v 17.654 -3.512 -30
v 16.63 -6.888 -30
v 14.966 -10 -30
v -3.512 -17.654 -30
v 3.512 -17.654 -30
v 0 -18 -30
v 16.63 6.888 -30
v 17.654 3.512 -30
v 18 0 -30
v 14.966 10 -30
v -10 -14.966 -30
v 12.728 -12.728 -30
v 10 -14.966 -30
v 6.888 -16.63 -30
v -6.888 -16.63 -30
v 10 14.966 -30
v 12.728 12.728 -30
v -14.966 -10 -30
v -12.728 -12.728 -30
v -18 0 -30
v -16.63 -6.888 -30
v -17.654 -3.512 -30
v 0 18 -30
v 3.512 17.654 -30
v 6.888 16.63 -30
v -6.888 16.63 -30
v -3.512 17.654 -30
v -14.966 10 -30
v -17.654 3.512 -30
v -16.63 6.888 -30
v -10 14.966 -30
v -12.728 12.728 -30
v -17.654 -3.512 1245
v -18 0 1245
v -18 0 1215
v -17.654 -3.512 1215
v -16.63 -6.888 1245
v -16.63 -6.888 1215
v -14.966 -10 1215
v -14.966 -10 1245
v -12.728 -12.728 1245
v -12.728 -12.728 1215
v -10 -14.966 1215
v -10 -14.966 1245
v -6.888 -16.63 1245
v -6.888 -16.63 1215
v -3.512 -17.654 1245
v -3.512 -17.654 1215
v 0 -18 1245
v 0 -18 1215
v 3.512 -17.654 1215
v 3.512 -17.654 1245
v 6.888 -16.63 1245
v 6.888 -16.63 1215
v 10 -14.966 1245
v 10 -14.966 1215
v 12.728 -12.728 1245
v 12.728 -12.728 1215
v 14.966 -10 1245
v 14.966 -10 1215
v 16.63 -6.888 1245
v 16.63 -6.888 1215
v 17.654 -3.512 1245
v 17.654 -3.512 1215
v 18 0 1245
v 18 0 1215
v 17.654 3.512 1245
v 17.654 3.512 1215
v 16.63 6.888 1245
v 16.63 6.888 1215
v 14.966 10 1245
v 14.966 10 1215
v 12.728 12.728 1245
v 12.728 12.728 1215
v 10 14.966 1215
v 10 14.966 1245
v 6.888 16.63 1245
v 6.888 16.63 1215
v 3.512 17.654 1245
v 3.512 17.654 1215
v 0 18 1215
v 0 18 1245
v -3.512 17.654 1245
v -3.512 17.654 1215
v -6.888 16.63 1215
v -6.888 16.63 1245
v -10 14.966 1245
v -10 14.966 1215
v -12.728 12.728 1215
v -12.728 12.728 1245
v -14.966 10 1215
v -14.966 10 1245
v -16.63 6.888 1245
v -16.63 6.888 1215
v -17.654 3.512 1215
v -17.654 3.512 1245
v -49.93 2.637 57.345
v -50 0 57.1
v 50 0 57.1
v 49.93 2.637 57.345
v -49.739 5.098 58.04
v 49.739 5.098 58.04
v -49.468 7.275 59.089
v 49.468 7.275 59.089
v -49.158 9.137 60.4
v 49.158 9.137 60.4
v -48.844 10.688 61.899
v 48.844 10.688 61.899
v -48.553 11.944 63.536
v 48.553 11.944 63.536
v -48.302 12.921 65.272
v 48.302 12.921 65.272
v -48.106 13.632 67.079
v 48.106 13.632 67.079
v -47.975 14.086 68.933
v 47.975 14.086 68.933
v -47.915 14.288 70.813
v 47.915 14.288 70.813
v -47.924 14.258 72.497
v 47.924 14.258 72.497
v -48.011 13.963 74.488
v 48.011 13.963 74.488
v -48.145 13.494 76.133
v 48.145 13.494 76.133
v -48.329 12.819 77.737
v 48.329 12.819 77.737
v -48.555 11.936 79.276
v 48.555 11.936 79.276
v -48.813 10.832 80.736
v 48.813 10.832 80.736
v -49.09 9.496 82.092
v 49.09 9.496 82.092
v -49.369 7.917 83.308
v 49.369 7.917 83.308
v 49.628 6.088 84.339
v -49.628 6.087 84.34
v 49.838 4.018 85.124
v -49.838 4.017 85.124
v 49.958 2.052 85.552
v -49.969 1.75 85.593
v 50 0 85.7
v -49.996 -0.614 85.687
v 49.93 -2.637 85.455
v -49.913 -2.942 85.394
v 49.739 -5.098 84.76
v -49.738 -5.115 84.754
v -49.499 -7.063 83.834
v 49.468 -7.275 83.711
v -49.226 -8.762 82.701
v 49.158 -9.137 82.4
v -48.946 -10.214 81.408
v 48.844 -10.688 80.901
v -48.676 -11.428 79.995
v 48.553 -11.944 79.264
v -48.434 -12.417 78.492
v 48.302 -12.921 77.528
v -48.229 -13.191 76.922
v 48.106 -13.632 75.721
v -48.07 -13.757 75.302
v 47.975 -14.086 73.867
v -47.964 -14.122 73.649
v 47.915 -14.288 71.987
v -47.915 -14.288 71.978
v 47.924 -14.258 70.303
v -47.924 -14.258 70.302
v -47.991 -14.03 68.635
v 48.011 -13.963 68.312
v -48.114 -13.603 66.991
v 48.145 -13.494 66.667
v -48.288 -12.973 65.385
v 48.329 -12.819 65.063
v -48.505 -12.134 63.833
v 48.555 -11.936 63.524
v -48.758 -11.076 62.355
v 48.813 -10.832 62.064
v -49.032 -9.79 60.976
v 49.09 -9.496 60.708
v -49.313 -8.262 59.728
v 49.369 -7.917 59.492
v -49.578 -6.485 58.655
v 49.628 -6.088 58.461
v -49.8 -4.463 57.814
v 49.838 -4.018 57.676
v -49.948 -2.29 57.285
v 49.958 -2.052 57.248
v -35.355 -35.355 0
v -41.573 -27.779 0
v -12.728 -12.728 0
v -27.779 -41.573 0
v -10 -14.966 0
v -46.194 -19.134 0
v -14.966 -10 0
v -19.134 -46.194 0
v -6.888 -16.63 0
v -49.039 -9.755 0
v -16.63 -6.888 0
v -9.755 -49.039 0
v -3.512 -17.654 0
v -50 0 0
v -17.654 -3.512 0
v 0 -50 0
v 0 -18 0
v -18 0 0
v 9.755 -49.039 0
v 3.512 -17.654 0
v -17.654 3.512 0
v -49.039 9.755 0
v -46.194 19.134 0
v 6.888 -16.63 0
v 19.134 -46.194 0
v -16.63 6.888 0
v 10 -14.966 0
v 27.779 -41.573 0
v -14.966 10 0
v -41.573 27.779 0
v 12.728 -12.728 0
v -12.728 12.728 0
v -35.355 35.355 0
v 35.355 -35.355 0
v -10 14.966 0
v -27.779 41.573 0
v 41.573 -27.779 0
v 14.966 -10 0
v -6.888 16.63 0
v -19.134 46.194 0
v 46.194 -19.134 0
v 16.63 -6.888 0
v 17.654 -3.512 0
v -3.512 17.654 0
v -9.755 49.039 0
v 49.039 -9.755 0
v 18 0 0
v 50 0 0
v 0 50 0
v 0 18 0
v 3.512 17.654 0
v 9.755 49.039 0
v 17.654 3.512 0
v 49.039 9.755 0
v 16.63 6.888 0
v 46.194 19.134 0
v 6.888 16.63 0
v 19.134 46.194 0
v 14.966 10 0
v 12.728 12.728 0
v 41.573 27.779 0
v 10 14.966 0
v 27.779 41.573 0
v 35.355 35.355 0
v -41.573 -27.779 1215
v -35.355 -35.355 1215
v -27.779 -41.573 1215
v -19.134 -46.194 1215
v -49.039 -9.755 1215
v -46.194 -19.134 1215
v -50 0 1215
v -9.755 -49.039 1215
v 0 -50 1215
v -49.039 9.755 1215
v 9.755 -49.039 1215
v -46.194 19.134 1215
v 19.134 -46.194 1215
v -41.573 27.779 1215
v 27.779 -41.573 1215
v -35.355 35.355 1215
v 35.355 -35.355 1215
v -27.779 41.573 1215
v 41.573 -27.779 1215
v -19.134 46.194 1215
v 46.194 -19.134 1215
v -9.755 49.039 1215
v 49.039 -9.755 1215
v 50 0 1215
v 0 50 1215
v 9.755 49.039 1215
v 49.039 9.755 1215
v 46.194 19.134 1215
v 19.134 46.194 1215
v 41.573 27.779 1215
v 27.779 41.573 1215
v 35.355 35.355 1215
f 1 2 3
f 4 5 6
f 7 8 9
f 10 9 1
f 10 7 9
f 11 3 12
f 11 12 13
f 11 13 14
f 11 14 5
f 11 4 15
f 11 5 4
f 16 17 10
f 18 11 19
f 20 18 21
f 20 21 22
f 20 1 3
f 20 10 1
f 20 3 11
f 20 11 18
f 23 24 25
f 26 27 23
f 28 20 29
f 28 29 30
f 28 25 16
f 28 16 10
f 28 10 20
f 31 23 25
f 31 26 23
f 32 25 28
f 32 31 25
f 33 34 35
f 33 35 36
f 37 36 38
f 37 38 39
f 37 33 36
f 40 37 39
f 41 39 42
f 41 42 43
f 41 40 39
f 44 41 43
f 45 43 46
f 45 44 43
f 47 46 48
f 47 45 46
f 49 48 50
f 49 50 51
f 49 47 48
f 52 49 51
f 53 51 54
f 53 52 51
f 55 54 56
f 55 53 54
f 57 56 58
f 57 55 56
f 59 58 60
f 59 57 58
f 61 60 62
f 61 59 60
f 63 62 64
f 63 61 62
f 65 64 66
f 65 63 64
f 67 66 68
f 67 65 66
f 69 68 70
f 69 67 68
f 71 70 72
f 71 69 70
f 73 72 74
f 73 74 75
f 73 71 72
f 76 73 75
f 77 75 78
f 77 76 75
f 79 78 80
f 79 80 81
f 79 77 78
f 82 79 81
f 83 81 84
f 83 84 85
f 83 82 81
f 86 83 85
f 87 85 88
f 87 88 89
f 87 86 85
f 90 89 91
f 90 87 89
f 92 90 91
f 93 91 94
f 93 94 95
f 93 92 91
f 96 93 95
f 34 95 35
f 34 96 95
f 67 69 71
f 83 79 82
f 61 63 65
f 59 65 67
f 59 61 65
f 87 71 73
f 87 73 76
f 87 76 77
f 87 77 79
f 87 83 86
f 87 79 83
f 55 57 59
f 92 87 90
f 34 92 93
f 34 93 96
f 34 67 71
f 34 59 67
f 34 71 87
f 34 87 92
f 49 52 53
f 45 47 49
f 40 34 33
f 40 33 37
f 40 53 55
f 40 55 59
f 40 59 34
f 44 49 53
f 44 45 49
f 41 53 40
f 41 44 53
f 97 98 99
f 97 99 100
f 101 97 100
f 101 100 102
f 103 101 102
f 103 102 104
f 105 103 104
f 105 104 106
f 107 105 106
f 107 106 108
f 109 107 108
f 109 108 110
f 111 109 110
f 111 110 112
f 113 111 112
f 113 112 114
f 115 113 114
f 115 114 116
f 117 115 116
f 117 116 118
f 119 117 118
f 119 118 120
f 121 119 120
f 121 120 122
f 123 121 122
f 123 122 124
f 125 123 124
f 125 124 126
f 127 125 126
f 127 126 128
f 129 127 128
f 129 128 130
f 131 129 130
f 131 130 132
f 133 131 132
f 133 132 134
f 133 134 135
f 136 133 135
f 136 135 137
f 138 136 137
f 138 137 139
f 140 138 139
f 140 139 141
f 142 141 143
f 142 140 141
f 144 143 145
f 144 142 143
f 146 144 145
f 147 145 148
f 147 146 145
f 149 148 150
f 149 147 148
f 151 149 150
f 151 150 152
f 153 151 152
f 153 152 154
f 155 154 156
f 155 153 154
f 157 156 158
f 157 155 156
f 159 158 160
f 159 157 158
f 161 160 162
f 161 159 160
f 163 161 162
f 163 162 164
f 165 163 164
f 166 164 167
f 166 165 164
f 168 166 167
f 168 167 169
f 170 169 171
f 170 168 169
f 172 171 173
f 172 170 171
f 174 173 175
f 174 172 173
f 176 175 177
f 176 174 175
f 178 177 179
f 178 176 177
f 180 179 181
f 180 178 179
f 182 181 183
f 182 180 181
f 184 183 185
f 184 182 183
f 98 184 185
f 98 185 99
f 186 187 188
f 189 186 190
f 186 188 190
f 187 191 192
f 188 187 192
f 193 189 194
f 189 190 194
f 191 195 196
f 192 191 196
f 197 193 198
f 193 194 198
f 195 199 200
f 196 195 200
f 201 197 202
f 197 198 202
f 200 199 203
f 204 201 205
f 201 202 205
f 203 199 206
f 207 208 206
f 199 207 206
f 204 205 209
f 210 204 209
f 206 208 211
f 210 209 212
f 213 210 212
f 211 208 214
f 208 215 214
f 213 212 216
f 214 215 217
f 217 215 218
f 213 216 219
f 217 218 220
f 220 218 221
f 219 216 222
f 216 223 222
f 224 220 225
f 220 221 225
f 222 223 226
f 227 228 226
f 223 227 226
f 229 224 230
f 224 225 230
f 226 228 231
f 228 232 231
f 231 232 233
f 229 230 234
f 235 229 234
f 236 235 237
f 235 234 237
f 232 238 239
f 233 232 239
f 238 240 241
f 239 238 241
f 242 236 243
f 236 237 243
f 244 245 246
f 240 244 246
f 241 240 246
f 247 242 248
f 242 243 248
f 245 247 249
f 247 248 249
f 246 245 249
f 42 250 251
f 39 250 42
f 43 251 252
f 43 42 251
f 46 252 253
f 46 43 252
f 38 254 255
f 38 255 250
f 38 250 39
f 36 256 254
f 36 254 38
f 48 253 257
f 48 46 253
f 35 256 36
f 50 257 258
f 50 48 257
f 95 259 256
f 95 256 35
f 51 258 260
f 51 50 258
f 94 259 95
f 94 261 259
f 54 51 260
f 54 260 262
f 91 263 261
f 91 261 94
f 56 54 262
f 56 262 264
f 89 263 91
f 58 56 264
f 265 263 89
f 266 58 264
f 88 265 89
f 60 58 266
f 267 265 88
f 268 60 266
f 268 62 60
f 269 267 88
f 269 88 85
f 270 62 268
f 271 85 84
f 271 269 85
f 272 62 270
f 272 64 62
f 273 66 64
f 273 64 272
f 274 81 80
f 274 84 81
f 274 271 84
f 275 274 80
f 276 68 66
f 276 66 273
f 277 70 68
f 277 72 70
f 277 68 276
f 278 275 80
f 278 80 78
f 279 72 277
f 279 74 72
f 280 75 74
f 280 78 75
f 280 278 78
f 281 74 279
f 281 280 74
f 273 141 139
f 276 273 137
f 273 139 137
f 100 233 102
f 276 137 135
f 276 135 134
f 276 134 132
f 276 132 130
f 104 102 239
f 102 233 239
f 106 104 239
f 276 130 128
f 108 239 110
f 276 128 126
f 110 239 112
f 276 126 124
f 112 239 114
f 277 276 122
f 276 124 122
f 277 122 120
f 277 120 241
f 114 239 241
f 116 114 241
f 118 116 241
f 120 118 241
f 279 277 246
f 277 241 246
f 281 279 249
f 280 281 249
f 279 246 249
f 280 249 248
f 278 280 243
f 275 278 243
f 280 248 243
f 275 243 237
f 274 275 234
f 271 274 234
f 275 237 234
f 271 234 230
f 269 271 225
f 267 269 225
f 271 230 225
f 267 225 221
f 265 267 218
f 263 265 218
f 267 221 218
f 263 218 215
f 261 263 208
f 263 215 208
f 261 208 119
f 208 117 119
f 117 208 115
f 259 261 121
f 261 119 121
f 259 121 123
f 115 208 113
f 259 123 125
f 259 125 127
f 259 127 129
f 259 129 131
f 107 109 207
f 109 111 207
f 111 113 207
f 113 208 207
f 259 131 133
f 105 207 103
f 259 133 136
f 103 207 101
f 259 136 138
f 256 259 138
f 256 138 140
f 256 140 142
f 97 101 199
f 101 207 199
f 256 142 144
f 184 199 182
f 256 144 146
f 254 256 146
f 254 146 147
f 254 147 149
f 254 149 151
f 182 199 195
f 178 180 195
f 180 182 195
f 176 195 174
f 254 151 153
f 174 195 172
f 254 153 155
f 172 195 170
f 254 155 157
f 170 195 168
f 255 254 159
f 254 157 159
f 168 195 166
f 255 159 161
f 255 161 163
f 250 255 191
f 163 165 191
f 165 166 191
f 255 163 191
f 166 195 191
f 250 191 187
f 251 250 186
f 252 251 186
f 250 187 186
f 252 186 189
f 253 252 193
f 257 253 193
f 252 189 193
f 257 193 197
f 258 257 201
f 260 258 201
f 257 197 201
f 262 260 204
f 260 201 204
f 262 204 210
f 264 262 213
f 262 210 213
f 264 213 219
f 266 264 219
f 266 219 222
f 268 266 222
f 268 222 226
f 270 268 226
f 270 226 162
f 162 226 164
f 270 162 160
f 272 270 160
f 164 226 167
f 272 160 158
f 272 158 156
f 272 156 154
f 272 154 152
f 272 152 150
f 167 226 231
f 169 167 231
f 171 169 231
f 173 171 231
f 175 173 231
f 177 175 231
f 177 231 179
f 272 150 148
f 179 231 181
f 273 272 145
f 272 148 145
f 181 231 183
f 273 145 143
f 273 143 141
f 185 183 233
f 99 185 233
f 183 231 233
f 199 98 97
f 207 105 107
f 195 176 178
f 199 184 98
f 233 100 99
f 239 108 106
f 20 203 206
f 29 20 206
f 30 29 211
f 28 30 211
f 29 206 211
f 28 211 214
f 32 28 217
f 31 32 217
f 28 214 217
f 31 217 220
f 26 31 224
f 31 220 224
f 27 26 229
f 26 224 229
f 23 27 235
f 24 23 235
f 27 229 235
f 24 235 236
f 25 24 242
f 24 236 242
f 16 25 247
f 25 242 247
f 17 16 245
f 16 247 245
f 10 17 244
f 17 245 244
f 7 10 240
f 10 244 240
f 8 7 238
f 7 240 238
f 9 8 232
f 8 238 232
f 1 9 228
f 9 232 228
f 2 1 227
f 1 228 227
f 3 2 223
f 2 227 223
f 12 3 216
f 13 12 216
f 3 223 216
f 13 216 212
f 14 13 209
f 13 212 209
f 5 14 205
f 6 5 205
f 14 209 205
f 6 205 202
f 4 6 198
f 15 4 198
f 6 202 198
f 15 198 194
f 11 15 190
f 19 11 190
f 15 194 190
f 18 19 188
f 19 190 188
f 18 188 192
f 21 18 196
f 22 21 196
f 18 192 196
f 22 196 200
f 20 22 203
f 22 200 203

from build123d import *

# Parameters (mm, degrees)
ESQUISSE1_R                  = 50
BOSS_EXTRU_1_DEPTH           = 1215
ESQUISSE2_R                  = 18
BOSS_EXTRU_2_DEPTH           = 30
BOSS_EXTRU_3_START           = 30
ESQUISSE3_R                  = 18
BOSS_EXTRU_3_DEPTH           = 30
ENL_V_MAT_EXTRU_1_DEPTH      = 1248.00641538
ENL_V_MAT_EXTRU_1_DEPTH_BACK = 1248.00641538
ESQUISSE6_R                  = 14.3


with BuildPart() as part:
    # Esquisse1 → Boss.-Extru.1 (new body)
    with BuildSketch(Plane.XY):
        Circle(ESQUISSE1_R)
    extrude(amount=BOSS_EXTRU_1_DEPTH)

    # Esquisse2 → Boss.-Extru.2 (add)
    with BuildSketch(Plane(origin=(0, 0, 0), x_dir=(-1, 0, 0), z_dir=(0, 0, -1))):
        Circle(ESQUISSE2_R)
    extrude(amount=BOSS_EXTRU_2_DEPTH)

    # Esquisse3 → Boss.-Extru.3 (add)
    with BuildSketch(Plane.XY.offset(1215).offset(BOSS_EXTRU_3_START)):
        with Locations(Location((0, 0, 0), (0, 0, 180))):
            Circle(ESQUISSE3_R)
    extrude(amount=-BOSS_EXTRU_3_DEPTH)

    # Esquisse6 → Enlèv. mat.-Extru.1 (cut, two sides: drawn at the far end of the back side and taken through both)
    with BuildSketch(Plane(origin=(0, 0, 0), x_dir=(0, 0, -1), z_dir=(1, 0, 0)).offset(-ENL_V_MAT_EXTRU_1_DEPTH_BACK)):
        with Locations((-71.4, 0)):
            Circle(ESQUISSE6_R)
    extrude(amount=ENL_V_MAT_EXTRU_1_DEPTH + ENL_V_MAT_EXTRU_1_DEPTH_BACK, mode=Mode.SUBTRACT)


solid = part.part
